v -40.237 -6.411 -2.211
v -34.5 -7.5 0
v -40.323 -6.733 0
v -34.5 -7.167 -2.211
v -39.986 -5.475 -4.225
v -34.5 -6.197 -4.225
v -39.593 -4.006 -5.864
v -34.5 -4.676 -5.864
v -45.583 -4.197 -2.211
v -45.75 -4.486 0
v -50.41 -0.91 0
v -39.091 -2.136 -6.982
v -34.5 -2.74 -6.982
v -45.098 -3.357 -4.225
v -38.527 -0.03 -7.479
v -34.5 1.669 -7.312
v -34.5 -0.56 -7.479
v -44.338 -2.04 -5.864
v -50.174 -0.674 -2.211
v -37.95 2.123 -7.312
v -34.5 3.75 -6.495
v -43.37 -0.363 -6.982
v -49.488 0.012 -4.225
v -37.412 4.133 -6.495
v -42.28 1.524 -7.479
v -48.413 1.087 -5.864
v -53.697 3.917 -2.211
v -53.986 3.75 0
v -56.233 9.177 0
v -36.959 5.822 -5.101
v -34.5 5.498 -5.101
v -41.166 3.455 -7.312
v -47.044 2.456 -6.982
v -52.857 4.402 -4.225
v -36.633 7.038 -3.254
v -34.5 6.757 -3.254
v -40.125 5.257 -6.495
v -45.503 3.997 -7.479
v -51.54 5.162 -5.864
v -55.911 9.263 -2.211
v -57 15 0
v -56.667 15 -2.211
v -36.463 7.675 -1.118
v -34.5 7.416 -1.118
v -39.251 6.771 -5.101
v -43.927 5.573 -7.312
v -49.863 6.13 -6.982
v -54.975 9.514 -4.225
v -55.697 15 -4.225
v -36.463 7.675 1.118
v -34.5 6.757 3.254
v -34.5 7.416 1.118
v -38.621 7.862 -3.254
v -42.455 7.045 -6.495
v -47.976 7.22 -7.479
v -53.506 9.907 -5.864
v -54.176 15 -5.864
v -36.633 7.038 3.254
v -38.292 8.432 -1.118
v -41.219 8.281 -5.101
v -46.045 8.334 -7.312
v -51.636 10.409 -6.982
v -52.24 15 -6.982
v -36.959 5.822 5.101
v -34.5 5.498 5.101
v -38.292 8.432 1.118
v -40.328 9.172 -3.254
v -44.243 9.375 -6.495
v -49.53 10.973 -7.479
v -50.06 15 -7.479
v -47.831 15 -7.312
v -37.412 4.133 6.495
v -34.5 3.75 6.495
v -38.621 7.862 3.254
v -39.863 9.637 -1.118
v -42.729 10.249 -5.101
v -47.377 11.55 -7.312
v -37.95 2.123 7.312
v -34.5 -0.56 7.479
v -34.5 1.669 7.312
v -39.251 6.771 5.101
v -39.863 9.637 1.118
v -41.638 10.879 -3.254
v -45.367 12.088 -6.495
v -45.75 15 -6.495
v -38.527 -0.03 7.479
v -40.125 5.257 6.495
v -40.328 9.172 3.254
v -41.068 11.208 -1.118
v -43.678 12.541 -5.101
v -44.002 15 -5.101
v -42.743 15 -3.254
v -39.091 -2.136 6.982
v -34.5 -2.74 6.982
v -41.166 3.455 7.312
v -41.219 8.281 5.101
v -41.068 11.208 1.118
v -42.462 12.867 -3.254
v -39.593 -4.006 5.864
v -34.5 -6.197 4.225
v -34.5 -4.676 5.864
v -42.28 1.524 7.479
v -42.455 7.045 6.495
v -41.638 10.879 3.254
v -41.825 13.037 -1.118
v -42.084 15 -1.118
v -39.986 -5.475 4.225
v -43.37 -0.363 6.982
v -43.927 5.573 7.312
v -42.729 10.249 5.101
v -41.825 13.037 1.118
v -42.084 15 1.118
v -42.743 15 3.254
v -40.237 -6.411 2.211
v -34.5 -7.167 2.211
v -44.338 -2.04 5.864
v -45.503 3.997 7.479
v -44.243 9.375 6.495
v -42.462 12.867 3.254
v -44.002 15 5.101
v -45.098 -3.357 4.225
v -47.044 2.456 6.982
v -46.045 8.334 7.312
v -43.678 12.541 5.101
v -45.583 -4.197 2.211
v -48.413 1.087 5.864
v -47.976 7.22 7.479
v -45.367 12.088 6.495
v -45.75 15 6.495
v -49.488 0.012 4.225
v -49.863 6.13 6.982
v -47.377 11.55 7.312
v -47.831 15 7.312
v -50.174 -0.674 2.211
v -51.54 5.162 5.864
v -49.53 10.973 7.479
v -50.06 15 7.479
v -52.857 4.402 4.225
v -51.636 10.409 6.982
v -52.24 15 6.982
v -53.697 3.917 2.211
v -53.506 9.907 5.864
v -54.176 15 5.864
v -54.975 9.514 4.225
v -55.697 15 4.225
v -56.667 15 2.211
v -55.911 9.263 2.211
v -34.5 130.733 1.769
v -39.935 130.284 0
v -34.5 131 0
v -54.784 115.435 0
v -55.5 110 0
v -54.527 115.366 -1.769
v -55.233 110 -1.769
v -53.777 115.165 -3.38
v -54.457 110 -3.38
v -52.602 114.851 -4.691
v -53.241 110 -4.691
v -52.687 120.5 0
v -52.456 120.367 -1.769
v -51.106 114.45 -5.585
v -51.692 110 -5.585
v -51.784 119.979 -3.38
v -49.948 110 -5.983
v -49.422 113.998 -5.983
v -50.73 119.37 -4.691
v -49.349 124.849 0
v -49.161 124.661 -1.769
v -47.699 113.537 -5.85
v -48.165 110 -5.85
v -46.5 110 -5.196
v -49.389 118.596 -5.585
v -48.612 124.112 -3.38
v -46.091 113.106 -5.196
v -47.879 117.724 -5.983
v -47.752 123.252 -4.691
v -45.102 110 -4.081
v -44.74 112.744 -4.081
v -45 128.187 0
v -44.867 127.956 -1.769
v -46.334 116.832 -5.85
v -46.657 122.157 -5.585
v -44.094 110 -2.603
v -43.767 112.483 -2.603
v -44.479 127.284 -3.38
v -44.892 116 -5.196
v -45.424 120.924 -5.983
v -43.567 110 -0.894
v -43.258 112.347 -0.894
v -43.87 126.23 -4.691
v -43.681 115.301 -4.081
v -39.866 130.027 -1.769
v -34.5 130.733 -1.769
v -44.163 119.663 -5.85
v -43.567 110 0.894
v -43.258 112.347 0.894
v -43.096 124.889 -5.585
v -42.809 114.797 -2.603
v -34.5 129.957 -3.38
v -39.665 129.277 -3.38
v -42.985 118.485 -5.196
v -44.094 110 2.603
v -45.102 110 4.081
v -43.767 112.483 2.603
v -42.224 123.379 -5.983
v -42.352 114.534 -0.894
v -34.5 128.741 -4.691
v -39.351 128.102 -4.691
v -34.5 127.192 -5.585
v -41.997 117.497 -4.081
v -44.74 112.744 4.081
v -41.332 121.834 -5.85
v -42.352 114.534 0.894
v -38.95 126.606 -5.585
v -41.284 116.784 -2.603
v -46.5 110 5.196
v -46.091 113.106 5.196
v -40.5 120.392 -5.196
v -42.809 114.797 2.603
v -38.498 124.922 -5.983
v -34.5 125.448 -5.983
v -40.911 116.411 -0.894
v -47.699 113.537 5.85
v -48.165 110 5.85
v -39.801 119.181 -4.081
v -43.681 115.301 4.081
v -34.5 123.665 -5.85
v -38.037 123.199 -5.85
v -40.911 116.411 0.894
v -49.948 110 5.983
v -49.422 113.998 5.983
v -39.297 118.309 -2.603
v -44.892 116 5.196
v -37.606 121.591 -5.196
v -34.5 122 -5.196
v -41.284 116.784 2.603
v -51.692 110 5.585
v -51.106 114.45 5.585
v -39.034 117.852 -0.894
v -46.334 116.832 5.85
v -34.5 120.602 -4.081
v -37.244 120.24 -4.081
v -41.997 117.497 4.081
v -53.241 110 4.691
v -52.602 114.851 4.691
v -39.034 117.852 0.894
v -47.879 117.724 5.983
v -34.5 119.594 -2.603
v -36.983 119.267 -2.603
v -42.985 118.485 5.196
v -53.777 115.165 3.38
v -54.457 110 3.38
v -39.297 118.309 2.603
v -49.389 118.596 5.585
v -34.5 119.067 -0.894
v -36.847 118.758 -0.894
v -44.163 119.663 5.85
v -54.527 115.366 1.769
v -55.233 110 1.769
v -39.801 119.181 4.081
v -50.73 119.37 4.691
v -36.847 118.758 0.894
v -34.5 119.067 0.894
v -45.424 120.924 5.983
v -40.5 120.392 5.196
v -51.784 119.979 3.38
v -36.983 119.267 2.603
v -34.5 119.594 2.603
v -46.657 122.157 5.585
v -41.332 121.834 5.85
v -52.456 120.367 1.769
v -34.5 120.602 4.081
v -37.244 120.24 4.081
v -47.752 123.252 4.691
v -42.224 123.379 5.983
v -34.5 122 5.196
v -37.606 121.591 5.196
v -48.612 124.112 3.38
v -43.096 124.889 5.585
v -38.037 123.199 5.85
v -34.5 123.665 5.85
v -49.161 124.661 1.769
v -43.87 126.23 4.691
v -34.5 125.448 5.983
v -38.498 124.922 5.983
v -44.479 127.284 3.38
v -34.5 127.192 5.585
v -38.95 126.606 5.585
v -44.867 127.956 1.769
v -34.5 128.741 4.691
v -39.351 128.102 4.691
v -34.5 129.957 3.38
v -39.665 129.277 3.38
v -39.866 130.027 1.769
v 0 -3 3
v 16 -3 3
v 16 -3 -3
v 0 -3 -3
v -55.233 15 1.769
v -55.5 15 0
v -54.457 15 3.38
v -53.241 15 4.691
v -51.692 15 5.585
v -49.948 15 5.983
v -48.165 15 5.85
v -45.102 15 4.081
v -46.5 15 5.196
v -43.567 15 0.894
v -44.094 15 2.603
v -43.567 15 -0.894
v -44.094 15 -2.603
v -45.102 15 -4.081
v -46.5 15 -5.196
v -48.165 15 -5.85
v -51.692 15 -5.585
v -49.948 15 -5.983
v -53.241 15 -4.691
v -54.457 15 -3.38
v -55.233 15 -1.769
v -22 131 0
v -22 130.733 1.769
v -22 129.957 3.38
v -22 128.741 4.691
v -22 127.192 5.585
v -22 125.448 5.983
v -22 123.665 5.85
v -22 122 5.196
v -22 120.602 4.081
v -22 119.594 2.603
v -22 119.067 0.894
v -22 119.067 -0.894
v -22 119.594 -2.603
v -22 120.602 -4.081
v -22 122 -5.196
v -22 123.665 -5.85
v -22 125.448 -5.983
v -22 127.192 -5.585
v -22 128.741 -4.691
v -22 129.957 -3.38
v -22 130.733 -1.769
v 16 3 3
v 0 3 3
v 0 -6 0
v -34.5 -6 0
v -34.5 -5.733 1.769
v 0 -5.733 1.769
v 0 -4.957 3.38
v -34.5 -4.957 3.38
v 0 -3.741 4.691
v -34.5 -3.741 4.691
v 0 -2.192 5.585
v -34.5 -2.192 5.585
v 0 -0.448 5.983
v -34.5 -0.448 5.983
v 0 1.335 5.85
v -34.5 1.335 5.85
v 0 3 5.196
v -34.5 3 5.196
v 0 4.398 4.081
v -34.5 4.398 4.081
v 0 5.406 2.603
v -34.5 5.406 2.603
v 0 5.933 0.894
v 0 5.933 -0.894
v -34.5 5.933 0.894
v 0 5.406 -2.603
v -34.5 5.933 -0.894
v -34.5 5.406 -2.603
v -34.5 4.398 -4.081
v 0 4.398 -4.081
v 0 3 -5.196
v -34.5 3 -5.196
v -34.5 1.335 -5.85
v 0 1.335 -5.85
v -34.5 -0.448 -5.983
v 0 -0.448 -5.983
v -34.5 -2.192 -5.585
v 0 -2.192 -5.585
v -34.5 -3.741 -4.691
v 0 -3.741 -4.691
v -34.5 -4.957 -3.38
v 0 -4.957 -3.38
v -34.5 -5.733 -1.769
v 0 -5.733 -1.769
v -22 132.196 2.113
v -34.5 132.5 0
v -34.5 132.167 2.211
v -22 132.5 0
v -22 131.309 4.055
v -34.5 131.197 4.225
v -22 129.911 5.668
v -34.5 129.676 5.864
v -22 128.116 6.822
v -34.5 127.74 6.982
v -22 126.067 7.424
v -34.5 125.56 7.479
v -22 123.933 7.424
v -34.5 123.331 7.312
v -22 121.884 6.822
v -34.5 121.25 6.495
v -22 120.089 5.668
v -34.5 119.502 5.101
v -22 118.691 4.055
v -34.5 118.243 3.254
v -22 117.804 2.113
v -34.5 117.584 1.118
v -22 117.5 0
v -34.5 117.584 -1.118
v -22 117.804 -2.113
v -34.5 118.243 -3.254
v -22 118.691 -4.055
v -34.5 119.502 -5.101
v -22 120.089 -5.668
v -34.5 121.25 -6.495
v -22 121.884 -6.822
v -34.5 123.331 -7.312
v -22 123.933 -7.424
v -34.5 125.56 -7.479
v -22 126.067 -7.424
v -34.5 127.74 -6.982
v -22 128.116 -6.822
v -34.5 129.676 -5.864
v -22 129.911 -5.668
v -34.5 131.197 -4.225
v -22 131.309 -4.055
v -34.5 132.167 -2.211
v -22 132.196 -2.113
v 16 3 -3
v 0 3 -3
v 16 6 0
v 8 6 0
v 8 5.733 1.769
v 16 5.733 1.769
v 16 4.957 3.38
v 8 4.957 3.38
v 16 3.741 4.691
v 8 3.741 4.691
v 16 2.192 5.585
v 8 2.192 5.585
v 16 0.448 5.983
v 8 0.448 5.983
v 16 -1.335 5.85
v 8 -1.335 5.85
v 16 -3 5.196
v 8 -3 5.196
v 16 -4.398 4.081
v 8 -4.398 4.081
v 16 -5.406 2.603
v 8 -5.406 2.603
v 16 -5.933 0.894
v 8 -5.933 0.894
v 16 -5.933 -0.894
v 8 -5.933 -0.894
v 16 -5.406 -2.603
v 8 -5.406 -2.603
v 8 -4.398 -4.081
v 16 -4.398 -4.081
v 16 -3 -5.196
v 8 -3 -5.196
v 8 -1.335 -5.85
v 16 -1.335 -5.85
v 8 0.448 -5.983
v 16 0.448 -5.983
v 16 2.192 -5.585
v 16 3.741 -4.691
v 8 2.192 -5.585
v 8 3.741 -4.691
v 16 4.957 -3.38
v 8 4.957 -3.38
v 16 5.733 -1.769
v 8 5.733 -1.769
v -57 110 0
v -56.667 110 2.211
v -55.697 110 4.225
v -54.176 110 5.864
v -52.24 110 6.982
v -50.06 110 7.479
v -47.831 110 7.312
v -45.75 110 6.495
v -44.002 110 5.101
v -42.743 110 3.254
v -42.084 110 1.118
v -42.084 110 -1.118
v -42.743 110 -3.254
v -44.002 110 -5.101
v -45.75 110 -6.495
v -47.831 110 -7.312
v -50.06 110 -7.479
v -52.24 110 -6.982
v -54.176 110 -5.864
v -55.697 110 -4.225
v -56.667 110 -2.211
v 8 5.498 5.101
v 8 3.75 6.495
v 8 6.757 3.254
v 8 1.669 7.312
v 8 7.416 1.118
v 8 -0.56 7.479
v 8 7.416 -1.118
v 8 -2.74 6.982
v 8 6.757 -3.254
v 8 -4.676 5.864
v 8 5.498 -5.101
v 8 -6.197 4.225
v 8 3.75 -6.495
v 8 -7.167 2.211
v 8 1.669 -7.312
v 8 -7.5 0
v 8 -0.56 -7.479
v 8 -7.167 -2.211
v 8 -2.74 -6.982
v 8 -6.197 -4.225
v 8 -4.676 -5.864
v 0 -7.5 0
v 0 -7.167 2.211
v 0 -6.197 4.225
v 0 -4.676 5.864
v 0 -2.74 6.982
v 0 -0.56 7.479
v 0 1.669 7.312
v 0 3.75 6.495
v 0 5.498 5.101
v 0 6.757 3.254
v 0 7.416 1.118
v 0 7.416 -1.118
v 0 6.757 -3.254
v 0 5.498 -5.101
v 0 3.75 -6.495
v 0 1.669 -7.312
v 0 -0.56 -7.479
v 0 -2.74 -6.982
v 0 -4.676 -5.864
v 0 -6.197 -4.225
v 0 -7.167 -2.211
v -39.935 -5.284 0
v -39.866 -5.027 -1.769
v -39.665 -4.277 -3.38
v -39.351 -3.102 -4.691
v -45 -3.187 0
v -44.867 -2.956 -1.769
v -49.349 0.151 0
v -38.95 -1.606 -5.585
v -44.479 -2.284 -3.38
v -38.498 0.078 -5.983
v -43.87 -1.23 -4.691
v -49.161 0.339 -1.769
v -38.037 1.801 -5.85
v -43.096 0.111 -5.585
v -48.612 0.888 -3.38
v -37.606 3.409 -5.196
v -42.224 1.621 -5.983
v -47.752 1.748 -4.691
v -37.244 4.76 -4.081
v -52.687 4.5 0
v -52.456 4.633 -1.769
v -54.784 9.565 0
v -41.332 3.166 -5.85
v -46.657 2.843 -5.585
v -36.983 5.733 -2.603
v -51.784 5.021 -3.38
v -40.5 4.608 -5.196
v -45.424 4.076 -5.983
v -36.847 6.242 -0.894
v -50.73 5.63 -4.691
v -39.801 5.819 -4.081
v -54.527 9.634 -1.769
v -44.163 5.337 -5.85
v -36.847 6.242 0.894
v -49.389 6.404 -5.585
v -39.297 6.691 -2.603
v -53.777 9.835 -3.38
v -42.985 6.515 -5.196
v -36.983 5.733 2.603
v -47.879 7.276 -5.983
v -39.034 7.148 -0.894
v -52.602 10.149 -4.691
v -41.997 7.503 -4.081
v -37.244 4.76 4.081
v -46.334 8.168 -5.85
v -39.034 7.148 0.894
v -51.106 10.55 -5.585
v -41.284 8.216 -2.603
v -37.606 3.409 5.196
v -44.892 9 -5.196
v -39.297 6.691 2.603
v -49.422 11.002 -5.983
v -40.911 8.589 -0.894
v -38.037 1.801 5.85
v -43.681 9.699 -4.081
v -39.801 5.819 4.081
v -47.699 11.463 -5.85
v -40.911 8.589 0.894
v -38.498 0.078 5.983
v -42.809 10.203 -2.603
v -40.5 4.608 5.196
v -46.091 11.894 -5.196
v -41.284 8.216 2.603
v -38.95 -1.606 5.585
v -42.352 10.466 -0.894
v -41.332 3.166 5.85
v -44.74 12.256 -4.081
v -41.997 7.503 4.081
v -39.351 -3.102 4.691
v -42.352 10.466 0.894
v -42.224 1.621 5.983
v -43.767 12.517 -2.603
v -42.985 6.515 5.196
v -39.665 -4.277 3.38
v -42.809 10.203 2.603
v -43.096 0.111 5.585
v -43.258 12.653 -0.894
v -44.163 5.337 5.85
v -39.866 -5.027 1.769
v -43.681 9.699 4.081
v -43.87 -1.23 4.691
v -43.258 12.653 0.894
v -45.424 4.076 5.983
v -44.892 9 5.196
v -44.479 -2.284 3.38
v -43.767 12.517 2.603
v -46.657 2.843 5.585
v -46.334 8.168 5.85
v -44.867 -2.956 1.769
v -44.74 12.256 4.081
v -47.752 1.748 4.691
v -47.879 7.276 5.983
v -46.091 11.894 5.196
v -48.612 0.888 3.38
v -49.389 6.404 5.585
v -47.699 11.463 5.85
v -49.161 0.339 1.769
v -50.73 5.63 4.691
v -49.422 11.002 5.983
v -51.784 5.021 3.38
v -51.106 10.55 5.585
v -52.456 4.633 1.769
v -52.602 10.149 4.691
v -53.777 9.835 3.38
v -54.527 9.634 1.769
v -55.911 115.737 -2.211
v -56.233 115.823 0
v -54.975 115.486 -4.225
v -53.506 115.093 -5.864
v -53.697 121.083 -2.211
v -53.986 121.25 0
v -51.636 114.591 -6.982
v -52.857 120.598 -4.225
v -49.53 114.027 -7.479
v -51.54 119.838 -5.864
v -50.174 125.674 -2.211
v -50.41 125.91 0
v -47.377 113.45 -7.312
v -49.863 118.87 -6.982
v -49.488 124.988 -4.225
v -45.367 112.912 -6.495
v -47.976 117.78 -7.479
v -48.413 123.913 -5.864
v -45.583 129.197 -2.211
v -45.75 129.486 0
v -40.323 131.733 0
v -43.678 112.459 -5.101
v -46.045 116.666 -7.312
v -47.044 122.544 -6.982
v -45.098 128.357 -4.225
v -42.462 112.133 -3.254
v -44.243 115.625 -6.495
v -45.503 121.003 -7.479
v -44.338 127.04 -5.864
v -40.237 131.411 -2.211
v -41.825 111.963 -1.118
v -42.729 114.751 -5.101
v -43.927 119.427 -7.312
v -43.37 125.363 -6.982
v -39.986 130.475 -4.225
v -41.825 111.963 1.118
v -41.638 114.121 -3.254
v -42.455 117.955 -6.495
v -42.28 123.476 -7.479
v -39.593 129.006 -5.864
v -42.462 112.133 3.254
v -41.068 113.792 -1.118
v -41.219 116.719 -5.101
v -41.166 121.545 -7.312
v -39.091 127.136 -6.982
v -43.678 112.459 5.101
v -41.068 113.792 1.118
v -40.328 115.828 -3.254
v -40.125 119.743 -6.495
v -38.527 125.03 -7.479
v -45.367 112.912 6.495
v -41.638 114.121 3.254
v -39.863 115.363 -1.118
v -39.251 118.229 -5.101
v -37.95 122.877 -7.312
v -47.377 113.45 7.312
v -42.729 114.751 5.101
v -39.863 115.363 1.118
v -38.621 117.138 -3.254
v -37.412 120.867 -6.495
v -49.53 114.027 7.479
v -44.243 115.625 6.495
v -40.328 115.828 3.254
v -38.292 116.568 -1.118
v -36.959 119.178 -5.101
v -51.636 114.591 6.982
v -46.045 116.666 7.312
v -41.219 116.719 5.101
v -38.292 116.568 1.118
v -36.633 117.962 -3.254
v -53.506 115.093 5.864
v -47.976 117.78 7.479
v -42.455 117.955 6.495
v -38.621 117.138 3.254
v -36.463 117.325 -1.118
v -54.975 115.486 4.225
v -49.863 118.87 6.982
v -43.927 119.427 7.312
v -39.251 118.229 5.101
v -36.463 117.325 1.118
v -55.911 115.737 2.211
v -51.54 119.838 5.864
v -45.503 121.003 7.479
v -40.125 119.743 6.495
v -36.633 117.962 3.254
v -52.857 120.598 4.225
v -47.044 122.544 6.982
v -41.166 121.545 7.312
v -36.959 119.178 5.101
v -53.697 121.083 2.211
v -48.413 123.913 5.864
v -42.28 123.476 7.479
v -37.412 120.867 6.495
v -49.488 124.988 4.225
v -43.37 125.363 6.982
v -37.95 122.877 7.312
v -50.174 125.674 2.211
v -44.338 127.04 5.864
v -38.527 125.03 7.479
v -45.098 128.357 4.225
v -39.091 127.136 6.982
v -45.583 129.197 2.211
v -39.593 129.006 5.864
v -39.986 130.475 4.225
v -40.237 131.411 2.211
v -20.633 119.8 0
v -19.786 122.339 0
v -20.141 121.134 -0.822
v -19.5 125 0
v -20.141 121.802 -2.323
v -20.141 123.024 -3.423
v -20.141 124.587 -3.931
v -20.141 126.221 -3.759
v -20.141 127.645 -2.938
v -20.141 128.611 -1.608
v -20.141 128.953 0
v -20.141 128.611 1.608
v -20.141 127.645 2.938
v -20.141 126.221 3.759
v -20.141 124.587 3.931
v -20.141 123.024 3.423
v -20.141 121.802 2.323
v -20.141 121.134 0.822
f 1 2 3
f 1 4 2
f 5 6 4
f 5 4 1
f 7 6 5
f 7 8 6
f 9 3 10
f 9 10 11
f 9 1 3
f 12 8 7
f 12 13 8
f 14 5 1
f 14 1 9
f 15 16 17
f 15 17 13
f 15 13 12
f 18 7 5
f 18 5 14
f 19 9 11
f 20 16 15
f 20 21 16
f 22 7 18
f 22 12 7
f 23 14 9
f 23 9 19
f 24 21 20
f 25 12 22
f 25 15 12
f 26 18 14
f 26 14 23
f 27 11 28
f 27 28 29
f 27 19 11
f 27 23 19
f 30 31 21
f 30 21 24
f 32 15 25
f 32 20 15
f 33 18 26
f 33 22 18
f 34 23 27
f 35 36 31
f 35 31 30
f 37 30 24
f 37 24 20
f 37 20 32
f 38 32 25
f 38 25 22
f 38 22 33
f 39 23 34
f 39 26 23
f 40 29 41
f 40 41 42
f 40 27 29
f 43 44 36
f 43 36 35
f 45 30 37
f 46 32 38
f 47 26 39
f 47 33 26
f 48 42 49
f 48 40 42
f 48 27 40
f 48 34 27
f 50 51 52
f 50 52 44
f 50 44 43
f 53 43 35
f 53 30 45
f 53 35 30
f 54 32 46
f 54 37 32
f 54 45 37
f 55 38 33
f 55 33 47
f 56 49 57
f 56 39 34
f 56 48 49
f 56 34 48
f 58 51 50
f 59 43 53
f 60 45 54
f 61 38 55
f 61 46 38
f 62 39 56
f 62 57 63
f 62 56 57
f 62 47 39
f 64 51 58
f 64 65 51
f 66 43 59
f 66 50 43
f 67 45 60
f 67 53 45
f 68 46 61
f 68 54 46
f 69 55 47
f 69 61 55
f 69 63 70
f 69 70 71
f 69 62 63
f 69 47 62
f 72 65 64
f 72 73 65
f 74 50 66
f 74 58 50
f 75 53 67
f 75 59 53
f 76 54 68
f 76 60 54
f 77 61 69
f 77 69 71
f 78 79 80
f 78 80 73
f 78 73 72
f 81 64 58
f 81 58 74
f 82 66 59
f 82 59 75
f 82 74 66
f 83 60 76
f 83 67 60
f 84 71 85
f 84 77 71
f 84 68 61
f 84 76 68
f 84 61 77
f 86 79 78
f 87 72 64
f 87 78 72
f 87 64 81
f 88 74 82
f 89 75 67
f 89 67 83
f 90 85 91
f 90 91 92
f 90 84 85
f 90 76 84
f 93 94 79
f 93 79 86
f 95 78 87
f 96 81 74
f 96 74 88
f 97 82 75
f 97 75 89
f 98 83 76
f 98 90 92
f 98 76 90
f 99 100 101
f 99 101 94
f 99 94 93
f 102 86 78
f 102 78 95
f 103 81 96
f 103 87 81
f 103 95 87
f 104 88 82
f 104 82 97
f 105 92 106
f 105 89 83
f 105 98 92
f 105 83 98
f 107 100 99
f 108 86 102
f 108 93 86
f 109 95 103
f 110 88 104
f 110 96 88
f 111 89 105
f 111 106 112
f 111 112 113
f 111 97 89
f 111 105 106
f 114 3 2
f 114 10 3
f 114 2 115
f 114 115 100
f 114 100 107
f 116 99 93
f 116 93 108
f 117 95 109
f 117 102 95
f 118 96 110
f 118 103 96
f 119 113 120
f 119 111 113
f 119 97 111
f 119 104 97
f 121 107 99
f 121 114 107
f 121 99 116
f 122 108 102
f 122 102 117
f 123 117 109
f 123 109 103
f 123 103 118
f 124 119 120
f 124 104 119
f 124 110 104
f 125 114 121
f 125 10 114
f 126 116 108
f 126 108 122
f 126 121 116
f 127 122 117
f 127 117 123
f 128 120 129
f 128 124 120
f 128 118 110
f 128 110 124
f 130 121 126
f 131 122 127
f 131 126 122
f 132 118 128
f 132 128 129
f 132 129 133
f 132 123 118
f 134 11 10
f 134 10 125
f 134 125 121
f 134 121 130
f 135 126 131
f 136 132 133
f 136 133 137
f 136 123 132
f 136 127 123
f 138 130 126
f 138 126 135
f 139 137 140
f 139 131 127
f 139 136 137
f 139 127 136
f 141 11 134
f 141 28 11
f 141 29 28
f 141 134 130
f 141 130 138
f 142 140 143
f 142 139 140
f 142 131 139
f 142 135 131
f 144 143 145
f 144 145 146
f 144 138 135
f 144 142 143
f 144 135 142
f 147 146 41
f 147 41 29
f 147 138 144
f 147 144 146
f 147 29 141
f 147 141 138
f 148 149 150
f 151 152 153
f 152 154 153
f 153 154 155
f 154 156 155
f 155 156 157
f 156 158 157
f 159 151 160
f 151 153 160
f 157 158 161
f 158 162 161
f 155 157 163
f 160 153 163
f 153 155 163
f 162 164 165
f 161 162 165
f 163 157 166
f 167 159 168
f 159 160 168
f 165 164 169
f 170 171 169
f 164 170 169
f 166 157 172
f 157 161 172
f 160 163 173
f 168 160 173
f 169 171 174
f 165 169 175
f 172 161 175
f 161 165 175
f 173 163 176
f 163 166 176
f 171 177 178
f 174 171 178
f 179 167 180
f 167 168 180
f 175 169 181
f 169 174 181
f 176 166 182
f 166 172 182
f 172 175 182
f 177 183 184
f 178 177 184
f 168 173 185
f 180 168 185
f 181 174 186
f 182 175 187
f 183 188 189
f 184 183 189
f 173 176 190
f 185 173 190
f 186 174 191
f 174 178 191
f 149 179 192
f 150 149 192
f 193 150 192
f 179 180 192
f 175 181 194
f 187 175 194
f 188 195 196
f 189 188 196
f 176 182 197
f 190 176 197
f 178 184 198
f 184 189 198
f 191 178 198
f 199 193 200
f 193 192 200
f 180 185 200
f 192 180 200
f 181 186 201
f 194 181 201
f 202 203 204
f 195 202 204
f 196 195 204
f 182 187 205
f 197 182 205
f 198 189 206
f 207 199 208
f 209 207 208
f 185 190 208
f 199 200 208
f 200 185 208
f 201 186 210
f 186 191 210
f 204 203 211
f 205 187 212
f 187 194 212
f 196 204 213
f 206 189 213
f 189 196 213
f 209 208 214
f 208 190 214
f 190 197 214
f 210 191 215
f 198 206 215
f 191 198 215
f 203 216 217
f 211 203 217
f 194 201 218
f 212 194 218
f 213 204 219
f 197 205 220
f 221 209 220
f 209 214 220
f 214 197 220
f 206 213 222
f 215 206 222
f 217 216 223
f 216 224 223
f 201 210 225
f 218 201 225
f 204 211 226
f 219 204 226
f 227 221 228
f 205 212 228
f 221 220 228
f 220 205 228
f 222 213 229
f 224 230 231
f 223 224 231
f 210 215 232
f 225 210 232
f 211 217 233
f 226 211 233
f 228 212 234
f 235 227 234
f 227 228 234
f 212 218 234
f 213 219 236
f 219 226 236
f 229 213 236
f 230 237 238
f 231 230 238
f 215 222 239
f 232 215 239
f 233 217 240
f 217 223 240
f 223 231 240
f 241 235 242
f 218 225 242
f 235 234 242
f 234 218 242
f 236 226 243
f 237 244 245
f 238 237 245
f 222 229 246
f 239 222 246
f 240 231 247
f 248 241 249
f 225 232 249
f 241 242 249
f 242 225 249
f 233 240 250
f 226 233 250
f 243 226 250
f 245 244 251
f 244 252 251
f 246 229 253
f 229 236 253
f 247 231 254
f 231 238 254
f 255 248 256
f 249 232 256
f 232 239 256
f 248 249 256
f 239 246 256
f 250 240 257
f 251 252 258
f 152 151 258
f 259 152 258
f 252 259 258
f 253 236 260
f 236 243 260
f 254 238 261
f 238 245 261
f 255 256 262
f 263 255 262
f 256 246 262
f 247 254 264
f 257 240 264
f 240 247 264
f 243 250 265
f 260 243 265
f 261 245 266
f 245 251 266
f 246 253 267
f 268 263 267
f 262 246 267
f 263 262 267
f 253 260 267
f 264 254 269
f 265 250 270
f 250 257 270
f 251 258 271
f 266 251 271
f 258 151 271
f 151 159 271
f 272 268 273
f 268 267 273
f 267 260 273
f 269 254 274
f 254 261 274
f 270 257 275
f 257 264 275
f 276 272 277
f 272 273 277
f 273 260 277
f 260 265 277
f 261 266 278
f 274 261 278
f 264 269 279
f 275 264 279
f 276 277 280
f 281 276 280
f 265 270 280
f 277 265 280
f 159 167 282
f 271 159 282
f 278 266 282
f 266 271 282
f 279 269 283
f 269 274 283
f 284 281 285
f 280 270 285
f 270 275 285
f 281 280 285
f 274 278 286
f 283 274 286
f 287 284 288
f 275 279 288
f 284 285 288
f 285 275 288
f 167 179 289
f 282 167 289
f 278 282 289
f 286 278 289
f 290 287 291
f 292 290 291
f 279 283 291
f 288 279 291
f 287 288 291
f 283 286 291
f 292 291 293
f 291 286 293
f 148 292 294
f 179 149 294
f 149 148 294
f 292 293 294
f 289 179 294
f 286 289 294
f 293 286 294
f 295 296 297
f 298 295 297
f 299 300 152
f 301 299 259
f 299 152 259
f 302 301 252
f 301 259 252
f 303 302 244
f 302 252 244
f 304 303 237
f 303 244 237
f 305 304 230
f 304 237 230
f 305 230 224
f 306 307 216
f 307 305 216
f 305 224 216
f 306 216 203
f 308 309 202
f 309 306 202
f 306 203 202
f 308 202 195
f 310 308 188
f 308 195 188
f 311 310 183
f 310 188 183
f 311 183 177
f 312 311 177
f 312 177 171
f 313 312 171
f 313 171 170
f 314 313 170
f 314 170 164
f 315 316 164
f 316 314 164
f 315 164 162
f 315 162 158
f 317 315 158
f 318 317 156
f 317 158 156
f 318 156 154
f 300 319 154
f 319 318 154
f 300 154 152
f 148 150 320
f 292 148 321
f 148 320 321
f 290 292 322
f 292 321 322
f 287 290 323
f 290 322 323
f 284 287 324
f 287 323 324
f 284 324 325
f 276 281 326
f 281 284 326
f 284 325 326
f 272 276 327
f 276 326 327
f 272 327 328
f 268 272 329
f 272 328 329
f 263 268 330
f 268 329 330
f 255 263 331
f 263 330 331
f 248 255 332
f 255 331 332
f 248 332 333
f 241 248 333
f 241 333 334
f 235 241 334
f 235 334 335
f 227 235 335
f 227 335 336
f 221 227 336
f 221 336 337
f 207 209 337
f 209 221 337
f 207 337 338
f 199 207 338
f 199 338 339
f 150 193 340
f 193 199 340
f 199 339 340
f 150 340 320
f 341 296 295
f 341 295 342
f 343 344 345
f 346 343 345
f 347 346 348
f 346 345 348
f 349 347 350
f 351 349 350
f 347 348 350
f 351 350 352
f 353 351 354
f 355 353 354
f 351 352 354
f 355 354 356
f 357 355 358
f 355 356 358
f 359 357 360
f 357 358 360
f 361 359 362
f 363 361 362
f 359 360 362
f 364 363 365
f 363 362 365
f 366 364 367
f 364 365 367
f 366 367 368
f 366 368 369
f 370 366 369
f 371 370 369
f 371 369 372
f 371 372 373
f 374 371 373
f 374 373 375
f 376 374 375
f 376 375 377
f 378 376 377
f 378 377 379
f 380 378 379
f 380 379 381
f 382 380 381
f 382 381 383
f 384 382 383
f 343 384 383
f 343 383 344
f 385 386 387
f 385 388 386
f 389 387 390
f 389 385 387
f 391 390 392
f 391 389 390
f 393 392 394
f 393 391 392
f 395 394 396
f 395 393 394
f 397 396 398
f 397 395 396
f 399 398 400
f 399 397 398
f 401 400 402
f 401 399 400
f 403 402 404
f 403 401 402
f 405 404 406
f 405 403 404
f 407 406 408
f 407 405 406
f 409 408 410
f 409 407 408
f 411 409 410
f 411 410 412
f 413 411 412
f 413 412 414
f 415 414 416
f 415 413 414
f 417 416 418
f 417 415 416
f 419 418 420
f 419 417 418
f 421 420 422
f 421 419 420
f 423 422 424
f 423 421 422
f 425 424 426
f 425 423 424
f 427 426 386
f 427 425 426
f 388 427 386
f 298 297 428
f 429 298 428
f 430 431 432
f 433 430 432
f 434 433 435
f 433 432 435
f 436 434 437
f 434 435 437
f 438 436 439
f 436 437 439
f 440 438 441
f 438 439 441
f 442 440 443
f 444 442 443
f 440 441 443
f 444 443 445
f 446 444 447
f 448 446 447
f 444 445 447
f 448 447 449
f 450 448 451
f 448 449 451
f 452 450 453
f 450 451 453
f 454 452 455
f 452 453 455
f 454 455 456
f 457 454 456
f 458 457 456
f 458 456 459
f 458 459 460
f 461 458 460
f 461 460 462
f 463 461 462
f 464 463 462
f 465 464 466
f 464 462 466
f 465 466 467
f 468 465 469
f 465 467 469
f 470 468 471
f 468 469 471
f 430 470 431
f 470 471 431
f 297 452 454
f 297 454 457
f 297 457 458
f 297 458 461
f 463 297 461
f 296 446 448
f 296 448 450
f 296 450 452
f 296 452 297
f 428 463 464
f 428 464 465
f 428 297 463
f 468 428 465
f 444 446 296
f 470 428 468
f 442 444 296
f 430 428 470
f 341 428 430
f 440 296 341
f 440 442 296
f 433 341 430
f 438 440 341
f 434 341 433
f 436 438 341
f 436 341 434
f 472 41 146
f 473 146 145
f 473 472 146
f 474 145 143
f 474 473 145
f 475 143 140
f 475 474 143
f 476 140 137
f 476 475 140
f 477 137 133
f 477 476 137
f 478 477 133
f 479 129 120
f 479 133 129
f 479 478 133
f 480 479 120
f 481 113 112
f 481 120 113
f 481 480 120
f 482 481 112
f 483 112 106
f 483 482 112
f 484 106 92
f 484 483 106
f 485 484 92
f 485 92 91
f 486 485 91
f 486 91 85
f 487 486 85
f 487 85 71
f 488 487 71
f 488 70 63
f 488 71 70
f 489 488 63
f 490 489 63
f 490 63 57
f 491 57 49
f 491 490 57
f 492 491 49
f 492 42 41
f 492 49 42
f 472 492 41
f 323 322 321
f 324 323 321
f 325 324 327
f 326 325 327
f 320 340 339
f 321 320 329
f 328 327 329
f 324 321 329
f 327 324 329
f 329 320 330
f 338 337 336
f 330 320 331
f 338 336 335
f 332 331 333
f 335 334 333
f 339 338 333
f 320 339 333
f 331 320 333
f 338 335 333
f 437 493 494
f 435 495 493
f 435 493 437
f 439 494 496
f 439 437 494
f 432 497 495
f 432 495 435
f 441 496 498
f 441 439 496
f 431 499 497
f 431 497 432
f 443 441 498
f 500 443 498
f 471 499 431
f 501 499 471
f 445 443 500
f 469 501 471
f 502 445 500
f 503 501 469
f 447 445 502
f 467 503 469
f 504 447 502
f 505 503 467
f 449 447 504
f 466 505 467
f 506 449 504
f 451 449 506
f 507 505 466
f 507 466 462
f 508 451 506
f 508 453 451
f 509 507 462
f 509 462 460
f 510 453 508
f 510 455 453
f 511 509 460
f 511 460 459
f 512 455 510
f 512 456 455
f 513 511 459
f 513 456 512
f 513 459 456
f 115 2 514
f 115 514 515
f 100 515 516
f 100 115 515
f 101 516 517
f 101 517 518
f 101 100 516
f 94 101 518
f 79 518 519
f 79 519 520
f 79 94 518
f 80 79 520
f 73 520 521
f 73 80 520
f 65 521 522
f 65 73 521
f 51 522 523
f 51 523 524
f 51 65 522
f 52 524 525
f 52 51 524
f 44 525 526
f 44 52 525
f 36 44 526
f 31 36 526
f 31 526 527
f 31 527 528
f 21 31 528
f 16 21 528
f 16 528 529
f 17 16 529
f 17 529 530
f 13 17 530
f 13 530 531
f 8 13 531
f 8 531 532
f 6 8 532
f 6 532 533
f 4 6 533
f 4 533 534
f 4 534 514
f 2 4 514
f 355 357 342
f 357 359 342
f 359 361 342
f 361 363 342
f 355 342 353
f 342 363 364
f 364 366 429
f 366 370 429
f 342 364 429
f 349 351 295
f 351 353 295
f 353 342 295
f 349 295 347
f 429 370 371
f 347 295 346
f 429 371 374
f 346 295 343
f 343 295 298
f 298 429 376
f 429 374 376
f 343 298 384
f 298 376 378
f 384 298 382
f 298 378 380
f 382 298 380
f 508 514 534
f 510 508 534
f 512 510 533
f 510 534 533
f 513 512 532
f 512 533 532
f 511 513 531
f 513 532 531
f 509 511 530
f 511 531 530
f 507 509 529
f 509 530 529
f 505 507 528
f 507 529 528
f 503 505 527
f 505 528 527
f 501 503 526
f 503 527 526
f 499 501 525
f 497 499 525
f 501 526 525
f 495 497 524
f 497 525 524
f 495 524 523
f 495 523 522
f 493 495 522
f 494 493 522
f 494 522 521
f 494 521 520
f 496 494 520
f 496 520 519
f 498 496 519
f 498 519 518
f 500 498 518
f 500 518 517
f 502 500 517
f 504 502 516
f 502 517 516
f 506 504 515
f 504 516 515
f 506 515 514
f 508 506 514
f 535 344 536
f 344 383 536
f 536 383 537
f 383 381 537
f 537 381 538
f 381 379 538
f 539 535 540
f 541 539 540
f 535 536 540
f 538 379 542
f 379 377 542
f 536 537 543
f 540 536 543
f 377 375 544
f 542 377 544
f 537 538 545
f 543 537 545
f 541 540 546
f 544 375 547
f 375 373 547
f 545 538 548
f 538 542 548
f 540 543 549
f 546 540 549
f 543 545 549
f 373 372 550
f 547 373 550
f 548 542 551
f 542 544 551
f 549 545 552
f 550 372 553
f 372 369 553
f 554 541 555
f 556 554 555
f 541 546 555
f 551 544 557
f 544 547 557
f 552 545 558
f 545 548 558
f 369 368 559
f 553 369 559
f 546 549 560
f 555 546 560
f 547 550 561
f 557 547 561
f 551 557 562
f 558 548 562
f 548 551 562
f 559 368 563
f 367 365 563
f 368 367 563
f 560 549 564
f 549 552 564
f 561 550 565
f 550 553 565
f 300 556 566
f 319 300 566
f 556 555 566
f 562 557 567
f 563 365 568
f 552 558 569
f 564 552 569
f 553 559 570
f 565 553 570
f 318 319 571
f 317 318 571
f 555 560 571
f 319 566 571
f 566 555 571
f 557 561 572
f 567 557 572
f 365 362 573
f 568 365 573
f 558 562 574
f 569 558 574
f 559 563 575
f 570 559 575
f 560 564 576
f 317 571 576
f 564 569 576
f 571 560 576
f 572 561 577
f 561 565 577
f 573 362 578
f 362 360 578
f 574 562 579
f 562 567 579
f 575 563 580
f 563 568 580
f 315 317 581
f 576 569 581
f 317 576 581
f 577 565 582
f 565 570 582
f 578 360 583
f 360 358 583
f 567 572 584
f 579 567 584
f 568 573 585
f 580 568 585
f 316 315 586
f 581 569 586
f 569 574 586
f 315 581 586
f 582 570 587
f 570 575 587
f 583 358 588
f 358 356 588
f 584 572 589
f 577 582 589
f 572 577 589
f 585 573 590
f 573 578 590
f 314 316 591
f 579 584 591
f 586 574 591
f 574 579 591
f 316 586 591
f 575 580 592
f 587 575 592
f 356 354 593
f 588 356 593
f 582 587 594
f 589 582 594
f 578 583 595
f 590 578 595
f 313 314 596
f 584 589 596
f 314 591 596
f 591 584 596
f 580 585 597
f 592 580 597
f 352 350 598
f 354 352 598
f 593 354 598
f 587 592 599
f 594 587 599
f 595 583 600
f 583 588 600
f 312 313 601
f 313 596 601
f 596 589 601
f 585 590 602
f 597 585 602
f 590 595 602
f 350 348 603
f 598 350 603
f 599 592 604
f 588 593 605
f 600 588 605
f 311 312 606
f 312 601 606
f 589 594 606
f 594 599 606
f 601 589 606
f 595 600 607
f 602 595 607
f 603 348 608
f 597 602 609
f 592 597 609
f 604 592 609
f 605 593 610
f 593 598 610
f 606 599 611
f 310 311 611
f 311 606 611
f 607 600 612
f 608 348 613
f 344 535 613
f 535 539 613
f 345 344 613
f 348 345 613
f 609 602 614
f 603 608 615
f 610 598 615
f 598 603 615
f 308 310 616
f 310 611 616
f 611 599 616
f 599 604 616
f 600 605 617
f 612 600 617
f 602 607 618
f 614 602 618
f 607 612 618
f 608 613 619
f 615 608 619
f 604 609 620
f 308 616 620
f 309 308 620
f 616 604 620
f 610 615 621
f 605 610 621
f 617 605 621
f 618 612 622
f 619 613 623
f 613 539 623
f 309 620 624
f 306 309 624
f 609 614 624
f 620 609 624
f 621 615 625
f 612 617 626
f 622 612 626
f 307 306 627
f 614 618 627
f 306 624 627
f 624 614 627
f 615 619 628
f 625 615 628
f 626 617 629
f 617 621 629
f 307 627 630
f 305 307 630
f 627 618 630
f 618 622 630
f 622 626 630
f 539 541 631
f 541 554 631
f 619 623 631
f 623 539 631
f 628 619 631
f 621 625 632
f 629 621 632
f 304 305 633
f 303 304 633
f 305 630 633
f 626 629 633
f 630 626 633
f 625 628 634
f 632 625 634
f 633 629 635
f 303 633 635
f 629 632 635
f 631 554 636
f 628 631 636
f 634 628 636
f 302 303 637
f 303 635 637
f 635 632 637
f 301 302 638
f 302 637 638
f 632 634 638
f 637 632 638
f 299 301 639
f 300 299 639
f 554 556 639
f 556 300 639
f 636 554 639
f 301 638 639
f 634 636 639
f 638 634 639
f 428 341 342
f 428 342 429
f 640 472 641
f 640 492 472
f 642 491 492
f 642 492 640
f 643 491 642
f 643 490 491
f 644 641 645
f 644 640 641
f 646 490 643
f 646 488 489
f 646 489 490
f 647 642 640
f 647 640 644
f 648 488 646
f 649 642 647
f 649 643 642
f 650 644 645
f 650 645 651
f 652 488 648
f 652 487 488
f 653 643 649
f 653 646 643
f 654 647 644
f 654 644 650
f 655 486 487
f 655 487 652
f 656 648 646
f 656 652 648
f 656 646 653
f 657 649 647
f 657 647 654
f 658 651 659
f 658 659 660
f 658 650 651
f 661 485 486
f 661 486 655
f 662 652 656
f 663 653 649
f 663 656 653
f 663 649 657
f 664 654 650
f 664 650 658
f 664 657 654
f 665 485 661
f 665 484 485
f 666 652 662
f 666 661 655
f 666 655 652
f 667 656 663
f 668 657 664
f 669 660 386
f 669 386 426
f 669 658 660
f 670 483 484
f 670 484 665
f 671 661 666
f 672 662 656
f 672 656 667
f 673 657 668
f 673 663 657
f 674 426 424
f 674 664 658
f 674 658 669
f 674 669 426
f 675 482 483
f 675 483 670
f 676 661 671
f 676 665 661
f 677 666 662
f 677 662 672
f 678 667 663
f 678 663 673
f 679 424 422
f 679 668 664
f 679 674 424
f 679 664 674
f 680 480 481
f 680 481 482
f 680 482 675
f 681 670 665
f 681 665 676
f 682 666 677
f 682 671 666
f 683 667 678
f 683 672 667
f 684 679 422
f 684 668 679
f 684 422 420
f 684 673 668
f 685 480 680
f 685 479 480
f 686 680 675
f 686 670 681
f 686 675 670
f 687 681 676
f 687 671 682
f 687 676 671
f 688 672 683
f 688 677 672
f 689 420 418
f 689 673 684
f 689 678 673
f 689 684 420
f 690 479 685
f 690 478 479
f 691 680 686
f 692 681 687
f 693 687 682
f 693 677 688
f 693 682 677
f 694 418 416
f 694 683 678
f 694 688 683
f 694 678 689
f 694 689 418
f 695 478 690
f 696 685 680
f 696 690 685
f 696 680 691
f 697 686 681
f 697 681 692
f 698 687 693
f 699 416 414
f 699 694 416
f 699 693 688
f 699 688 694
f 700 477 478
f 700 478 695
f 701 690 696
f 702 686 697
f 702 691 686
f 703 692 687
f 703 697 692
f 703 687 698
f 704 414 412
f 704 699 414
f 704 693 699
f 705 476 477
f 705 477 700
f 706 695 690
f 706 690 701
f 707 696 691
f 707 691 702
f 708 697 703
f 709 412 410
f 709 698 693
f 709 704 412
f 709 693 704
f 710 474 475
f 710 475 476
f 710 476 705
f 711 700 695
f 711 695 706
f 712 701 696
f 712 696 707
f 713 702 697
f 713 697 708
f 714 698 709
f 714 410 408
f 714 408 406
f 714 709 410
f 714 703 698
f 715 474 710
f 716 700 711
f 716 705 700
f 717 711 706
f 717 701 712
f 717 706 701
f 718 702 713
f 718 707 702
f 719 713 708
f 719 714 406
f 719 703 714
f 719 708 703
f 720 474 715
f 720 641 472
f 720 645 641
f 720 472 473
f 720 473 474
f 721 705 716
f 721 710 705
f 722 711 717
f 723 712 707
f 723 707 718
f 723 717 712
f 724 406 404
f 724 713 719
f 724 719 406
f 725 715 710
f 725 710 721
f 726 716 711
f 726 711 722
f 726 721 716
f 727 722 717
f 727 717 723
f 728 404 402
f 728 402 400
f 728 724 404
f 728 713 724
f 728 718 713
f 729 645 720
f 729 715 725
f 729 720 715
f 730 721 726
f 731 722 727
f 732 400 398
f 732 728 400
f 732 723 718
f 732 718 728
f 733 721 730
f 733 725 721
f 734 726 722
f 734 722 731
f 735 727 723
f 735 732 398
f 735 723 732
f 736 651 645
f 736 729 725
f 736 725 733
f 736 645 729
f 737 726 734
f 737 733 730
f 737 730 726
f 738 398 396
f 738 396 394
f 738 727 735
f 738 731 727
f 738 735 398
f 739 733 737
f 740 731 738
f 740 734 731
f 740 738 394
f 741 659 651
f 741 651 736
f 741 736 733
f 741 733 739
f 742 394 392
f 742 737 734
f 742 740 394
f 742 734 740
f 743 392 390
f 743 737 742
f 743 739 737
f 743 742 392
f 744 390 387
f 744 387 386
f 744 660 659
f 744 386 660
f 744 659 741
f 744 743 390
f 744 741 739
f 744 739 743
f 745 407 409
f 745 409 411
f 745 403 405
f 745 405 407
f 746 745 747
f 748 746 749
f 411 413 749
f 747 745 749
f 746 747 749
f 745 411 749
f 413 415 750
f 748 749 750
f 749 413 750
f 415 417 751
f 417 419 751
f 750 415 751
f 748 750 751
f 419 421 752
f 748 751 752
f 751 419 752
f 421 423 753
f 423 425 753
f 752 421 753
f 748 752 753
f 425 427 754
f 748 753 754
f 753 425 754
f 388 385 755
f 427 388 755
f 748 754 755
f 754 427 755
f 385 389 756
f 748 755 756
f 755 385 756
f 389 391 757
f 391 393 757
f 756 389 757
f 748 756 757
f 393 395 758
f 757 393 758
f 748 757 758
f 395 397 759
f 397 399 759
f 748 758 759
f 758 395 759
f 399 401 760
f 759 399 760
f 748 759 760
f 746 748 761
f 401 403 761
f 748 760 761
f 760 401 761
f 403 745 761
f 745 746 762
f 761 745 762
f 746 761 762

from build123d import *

# Parameters (mm, degrees)
SWEEP_THIN1_PROFILE_R   = 7.5
SWEEP_THIN1_PROFILE_R_2 = 6
SKETCH29_R              = 7.5
BOSS_EXTRUDE1_DEPTH     = 8
SKETCH30_R              = 6
BOSS_EXTRUDE2_DEPTH     = 8
SKETCH31_W              = 6
SKETCH31_H              = 6
CUT_EXTRUDE2_DEPTH      = 16


with BuildPart() as part:
    # Sweep-Thin1: sweep along a path in Sketch2
    with BuildLine(Plane.XY) as sweep_thin1_path:
        Line((0, 0), (-34.5, 0))
        ThreePointArc((-34.5, 0), (-45.106601718, 4.393398282), (-49.5, 15))
        Line((-49.5, 15), (-49.5, 110))
        ThreePointArc((-49.5, 110), (-45.106601718, 120.606601718), (-34.5, 125))
        Line((-34.5, 125), (-22, 125))
    # Sweep-Thin1 profile (on start of the path) → Sweep-Thin1 (sweep)
    with BuildSketch(Plane(origin=(0, 0, 0), x_dir=(0, -1, 0), z_dir=(-1, 0, 0))):
        Circle(SWEEP_THIN1_PROFILE_R)
        Circle(SWEEP_THIN1_PROFILE_R_2, mode=Mode.SUBTRACT)
    sweep(path=sweep_thin1_path.line)

    # Sketch27 → Revolve1 (revolve)
    with BuildSketch(Plane.XY):
        with BuildLine():
            Line((-22, 132.5), (-22, 125))
            Line((-22, 125), (-19.5, 125))
            ThreePointArc((-19.5, 125), (-20.141458774, 128.952847075), (-22, 132.5))
        make_face()
    revolve(axis=Axis((-22, 125, 0), (1, 0, 0)))

    # Sketch29 → Boss-Extrude1 (add)
    with BuildSketch(Plane(origin=(0, 0, 0), x_dir=(0, 0, -1), z_dir=(1, 0, 0))):
        Circle(SKETCH29_R)
    extrude(amount=BOSS_EXTRUDE1_DEPTH)

    # Sketch30 → Boss-Extrude2 (add)
    with BuildSketch(Plane(origin=(8, 0, 0), x_dir=(0, 0, -1), z_dir=(1, 0, 0))):
        Circle(SKETCH30_R)
    extrude(amount=BOSS_EXTRUDE2_DEPTH)

    # Sketch31 → Cut-Extrude2 (cut)
    with BuildSketch(Plane(origin=(16, 0, 0), x_dir=(0, 0, -1), z_dir=(1, 0, 0))):
        Rectangle(SKETCH31_W, SKETCH31_H)
    extrude(amount=-CUT_EXTRUDE2_DEPTH, mode=Mode.SUBTRACT)


solid = part.part
